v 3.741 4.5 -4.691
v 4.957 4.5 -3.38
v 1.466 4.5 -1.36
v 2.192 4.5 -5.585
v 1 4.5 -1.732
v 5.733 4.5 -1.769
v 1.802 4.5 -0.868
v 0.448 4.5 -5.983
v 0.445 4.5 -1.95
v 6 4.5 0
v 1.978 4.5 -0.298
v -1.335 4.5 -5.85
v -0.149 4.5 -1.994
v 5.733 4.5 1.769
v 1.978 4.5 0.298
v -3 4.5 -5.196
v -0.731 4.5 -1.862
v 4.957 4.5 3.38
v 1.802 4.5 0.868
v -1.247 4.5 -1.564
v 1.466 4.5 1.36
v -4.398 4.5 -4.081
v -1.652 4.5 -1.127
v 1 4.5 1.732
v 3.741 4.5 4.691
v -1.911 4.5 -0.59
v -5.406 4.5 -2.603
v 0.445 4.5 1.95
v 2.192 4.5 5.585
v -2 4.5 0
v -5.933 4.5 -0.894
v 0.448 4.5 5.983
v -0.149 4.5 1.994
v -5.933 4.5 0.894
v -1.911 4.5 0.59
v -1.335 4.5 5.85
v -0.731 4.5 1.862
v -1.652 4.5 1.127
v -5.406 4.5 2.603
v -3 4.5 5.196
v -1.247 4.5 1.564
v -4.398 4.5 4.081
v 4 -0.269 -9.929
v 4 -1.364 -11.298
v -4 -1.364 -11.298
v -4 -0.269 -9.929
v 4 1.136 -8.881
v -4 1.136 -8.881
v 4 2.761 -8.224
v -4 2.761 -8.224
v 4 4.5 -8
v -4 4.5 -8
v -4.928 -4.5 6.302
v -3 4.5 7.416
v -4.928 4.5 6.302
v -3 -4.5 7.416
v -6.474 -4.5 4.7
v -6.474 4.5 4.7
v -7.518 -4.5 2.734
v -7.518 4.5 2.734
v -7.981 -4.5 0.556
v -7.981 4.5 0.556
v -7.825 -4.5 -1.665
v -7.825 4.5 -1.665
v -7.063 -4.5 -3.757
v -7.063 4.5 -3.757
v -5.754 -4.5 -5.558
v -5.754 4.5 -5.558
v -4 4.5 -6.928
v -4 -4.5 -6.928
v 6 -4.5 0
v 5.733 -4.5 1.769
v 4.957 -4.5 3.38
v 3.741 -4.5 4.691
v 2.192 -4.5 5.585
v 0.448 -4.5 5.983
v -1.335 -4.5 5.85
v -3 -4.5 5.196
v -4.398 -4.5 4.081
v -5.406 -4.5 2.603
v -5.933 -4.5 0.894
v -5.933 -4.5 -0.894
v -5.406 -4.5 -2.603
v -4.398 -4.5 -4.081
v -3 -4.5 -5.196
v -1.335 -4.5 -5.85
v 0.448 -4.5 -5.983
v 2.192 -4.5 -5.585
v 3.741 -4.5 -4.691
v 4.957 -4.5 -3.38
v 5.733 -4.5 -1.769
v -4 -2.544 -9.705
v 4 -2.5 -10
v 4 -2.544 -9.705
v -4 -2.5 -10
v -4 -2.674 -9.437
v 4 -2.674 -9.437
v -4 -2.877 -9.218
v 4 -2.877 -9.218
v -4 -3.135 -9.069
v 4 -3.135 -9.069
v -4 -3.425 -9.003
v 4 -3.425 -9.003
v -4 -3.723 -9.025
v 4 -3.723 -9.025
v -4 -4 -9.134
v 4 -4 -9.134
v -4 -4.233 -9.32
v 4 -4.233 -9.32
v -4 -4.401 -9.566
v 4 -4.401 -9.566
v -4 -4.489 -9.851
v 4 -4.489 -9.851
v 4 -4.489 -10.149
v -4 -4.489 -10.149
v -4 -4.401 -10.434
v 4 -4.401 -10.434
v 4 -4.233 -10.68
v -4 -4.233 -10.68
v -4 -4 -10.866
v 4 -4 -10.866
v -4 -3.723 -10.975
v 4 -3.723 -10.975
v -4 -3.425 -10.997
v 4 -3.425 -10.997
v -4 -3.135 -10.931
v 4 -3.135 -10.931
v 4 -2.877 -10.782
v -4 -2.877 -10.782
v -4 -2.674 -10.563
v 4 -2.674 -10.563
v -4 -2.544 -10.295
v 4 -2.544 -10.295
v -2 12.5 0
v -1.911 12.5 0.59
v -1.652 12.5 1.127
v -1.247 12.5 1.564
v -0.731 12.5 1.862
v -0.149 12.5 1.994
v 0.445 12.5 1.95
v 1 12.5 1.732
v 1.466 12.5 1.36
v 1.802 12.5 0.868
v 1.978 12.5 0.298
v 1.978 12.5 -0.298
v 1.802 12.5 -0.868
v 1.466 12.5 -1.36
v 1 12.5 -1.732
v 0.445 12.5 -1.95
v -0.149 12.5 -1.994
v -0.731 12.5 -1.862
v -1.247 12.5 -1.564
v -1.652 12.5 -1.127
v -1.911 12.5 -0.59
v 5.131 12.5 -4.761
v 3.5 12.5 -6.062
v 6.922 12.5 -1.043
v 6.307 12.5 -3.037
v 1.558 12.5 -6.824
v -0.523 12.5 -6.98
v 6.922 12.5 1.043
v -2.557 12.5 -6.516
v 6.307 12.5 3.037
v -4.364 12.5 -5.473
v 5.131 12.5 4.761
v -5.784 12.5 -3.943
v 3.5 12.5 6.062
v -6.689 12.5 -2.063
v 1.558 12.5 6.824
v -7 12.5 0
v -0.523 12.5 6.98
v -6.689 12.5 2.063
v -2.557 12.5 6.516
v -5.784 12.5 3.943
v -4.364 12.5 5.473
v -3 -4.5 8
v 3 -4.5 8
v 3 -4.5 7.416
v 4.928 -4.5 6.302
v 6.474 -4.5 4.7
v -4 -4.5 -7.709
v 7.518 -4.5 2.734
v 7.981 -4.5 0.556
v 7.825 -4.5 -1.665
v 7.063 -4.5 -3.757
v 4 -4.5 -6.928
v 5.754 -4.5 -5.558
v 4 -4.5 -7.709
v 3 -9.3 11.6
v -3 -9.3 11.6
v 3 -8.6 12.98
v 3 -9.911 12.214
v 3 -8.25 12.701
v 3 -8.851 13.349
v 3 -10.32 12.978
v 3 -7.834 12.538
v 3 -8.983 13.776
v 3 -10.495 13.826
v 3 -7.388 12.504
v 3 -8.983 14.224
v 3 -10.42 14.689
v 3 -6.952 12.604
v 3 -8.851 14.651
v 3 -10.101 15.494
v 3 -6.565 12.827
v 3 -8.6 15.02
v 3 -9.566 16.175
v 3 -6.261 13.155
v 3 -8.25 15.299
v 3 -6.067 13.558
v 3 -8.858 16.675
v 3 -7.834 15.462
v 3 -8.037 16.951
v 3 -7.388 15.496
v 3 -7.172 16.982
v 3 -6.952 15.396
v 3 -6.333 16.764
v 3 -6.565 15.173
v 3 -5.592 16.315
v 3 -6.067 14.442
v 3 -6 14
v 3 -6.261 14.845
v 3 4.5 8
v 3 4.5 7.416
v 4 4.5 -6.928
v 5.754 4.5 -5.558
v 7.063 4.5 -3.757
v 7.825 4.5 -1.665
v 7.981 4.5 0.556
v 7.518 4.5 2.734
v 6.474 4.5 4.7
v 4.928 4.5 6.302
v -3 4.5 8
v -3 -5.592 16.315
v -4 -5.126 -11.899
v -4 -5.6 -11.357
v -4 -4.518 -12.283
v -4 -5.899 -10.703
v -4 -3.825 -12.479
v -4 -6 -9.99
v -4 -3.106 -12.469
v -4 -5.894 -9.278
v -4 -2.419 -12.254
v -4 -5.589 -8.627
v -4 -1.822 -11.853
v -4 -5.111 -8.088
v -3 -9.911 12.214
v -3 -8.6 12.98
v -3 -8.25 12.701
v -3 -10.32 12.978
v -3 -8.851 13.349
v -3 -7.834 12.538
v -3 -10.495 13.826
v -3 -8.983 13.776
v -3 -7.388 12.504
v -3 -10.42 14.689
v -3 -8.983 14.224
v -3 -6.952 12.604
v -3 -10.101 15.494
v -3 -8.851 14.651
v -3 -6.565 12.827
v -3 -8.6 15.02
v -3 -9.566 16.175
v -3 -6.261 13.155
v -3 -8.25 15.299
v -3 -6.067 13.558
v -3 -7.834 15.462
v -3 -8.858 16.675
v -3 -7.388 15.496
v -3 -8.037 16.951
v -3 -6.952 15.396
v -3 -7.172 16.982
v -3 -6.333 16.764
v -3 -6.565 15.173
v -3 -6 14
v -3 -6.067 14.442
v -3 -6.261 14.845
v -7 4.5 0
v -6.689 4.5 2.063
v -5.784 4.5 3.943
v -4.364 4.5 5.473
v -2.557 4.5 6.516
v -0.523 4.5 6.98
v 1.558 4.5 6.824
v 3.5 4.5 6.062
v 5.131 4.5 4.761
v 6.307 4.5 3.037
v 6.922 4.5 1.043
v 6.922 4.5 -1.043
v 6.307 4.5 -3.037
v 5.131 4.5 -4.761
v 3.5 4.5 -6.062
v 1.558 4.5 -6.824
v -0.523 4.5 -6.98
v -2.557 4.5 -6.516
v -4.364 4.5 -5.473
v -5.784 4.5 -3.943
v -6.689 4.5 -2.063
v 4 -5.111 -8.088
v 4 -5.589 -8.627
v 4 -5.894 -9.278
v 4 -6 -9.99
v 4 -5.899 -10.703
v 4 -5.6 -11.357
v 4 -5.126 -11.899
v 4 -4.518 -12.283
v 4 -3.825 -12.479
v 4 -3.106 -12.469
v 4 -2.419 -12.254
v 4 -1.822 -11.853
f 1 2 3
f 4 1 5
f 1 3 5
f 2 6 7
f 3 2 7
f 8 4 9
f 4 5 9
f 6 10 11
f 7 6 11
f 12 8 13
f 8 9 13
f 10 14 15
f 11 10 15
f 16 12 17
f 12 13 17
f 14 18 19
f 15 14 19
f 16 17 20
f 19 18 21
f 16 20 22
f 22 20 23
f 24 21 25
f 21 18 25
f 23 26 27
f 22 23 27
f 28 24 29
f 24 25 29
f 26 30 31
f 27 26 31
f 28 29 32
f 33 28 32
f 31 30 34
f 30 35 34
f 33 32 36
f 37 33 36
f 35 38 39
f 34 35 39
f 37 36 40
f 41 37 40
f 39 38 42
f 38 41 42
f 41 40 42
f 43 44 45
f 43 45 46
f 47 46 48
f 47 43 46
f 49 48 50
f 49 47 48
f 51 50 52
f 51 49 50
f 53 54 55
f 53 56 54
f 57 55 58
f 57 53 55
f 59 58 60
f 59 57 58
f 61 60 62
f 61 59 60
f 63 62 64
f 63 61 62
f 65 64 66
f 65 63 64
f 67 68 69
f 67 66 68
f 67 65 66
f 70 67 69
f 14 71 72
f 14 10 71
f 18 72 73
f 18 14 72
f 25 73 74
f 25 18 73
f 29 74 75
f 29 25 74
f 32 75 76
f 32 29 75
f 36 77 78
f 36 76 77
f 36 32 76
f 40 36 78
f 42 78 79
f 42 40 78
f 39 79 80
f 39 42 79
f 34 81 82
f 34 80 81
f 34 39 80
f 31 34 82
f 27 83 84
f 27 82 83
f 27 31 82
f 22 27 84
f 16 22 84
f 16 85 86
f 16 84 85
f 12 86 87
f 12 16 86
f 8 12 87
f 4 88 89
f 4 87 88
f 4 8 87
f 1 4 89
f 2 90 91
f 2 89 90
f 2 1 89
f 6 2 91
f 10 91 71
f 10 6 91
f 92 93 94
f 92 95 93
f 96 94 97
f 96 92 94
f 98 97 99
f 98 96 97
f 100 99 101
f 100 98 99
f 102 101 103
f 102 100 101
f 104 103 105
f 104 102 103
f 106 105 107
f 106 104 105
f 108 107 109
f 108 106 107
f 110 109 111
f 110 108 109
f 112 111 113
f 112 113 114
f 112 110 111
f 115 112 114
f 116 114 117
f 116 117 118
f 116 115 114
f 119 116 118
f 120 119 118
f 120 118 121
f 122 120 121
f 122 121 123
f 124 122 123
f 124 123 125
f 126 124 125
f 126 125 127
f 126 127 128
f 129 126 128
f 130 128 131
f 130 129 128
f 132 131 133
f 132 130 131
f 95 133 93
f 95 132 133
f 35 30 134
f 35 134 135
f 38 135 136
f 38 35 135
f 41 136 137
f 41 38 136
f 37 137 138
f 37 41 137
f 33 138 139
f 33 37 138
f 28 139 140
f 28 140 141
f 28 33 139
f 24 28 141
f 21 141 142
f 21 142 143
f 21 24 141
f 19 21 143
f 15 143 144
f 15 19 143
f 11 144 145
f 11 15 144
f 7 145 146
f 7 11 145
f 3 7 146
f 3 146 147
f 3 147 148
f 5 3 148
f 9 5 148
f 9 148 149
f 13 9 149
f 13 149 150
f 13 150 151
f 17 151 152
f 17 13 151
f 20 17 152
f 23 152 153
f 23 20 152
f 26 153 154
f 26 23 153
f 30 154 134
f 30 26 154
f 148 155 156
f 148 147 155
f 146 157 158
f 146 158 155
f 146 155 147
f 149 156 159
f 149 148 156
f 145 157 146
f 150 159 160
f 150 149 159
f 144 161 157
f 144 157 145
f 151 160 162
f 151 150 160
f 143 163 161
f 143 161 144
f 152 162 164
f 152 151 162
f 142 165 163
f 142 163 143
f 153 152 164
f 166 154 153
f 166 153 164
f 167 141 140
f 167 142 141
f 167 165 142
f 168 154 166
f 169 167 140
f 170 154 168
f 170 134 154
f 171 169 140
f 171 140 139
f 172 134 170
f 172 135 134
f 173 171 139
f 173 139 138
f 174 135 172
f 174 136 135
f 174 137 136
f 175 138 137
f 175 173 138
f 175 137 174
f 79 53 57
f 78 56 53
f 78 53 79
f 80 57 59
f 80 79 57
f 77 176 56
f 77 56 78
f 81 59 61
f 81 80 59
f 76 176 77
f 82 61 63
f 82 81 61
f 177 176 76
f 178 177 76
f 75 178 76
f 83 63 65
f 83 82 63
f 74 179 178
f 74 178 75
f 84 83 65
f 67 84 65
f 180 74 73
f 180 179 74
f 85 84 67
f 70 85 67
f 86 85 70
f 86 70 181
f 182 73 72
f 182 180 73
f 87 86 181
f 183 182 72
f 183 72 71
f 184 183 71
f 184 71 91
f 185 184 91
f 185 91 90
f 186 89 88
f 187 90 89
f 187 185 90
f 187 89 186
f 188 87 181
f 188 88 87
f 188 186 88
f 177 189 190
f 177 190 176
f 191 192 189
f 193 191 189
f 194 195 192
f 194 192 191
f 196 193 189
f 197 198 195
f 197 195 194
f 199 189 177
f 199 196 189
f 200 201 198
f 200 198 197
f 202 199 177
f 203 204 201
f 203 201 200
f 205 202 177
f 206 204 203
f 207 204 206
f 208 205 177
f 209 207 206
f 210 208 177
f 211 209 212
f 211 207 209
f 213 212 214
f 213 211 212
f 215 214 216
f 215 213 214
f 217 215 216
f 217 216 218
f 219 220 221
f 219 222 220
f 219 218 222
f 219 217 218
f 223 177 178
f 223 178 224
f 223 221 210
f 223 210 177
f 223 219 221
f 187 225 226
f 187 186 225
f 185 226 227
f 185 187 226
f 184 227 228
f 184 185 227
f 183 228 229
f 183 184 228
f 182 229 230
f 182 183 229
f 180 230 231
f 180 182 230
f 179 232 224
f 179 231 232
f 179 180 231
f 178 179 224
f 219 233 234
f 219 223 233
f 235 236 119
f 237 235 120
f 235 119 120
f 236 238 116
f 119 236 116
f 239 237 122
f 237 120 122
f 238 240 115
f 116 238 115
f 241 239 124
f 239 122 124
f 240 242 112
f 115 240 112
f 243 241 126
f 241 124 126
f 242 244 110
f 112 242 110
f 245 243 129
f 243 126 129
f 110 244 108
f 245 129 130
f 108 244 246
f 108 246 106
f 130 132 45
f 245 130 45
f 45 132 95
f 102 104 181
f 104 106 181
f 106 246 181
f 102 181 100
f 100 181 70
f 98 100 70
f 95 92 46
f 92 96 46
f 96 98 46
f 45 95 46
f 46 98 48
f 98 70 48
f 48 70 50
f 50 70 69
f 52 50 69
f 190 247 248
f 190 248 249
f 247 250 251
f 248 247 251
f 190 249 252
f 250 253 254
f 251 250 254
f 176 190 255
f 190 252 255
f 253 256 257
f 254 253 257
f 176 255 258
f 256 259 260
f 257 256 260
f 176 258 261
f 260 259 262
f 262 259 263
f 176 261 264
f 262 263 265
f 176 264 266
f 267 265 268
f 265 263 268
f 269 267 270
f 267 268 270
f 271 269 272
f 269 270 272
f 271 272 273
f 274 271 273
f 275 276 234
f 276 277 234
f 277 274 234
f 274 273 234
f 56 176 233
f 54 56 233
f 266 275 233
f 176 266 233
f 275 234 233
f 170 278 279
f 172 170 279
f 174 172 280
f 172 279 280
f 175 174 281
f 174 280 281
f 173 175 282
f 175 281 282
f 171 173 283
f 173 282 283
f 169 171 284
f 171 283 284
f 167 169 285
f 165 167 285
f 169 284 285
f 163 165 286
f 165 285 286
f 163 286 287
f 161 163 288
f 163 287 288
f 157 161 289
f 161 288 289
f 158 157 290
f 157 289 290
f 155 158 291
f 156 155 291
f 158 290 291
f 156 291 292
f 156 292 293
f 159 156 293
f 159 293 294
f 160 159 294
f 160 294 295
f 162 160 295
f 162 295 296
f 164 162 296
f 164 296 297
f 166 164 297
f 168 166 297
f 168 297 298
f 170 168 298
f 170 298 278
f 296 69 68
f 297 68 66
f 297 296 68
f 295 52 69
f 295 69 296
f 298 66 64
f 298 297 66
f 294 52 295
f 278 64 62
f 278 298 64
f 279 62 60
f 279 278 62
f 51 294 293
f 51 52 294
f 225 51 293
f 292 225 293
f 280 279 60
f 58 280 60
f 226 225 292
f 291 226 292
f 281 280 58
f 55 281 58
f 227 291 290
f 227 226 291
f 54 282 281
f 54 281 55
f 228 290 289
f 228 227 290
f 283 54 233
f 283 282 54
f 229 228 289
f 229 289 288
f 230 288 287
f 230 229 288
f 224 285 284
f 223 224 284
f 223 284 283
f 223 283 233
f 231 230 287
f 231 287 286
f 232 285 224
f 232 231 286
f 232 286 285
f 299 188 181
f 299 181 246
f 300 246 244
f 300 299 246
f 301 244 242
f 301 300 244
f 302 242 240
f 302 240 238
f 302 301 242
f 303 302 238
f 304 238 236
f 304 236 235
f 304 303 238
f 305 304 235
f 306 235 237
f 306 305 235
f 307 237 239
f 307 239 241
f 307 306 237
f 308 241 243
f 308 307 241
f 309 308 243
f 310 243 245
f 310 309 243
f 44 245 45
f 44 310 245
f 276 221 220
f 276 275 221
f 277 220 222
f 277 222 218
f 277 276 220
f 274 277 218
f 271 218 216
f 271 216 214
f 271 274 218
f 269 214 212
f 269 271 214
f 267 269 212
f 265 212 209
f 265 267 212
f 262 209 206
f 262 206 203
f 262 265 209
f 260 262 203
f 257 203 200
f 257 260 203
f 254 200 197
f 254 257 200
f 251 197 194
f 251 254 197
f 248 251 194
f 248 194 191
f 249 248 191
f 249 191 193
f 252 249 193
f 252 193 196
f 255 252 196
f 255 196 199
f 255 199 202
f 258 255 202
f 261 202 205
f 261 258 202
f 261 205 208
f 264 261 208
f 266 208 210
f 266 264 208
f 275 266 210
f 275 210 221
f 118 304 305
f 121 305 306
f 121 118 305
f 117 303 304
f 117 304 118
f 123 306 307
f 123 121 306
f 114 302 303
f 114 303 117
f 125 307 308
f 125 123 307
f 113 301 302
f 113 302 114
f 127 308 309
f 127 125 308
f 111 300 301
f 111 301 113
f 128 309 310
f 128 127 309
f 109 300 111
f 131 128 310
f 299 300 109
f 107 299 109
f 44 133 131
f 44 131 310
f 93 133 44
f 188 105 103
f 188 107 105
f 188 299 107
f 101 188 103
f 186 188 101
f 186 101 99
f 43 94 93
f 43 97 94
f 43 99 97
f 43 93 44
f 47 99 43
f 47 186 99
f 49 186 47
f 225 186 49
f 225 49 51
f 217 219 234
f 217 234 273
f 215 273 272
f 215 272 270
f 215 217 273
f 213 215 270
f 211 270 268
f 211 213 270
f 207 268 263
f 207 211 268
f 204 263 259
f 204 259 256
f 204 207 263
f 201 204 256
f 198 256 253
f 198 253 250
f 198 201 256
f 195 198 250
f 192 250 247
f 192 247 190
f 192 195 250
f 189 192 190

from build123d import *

# Parameters (mm, degrees)
F0_R     = 6
F1_DEPTH = 4.5
F2_R     = 7
F2_R_2   = 2
F3_DEPTH = 8
F4_R     = 1.5
F5_DEPTH = 3
F6_R     = 1
F7_DEPTH = 4


with BuildPart() as f1:
    # F0 (on Front) → F1 (new body, symmetric)
    with BuildSketch(Plane.XZ):
        with BuildLine():
            ThreePointArc((-8, 0), (0, -8), (8, 0))
            ThreePointArc((8, 0), (0, 8), (-8, 0))
        make_face()
        Circle(F0_R, mode=Mode.SUBTRACT)
    extrude(amount=F1_DEPTH, both=True)

    # F2 (on face) → F3 (join)
    with BuildSketch(Plane(origin=(0, 4.5, 0), x_dir=(-1, 0, 0), z_dir=(0, 1, 0))):
        Circle(F2_R)
        Circle(F2_R_2, mode=Mode.SUBTRACT)
    extrude(amount=F3_DEPTH)

    # F4 (on Right) → F5 (join, symmetric)
    with BuildSketch(Plane.YZ):
        with BuildLine():
            Line((4.5, 8), (-5.5923303169, 16.3153393661))
            ThreePointArc((-5.5923303169, 16.3153393661), (-9.8582842332, 15.8543180621), (-9.3, 11.6))
            Line((-9.3, 11.6), (-4.5, 8))
            Line((-4.5, 8), (-4.5, 6))
            Line((-4.5, 6), (4.5, 6))
            Line((4.5, 6), (4.5, 8))
        make_face()
        with Locations((-7.5, 14)):
            Circle(F4_R, mode=Mode.SUBTRACT)
    extrude(amount=F5_DEPTH, both=True)

    # F6 (on Right) → F7 (join, symmetric)
    with BuildSketch(Plane.YZ):
        with BuildLine():
            Line((-4.5, -6), (-4.5, -7.7087121525))
            ThreePointArc((-4.5, -7.7087121525), (-5.3825642408, -11.6449777747), (-1.3635014837, -11.2982195846))
            ThreePointArc((-1.3635014837, -11.2982195846), (1.1362631614, -8.8811345092), (4.5, -8))
            Line((4.5, -8), (4.5, -6))
            Line((4.5, -6), (-4.5, -6))
        make_face()
        with Locations((-3.5, -10)):
            Circle(F6_R, mode=Mode.SUBTRACT)
    extrude(amount=F7_DEPTH, both=True)


solid = f1.part
